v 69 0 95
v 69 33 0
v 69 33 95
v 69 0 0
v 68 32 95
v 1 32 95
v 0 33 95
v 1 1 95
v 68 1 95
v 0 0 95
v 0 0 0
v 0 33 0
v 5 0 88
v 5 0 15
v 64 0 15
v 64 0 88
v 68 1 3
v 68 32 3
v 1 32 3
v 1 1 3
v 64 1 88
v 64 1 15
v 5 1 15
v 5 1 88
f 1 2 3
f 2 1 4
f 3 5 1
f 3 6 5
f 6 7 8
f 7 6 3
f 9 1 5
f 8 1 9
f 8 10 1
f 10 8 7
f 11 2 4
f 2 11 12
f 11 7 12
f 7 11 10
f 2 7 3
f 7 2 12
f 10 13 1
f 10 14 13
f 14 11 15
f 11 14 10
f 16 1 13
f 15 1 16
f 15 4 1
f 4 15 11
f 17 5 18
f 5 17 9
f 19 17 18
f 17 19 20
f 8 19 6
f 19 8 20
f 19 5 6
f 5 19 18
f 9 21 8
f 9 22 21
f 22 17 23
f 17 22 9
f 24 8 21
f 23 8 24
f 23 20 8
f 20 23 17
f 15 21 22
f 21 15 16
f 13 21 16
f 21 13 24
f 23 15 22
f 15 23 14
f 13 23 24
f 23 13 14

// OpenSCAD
//67x93x22
x=67;
y=31;
z=93;
//square([x+4,y+4]);
difference() {
    translate([0,0,0])
    cube([x+2,y+2,z+2]);
    translate([1,1,3])
    cube([x,y,z]);
    translate([5,0,15])
    cube([x-8,y,z-20]);
}
